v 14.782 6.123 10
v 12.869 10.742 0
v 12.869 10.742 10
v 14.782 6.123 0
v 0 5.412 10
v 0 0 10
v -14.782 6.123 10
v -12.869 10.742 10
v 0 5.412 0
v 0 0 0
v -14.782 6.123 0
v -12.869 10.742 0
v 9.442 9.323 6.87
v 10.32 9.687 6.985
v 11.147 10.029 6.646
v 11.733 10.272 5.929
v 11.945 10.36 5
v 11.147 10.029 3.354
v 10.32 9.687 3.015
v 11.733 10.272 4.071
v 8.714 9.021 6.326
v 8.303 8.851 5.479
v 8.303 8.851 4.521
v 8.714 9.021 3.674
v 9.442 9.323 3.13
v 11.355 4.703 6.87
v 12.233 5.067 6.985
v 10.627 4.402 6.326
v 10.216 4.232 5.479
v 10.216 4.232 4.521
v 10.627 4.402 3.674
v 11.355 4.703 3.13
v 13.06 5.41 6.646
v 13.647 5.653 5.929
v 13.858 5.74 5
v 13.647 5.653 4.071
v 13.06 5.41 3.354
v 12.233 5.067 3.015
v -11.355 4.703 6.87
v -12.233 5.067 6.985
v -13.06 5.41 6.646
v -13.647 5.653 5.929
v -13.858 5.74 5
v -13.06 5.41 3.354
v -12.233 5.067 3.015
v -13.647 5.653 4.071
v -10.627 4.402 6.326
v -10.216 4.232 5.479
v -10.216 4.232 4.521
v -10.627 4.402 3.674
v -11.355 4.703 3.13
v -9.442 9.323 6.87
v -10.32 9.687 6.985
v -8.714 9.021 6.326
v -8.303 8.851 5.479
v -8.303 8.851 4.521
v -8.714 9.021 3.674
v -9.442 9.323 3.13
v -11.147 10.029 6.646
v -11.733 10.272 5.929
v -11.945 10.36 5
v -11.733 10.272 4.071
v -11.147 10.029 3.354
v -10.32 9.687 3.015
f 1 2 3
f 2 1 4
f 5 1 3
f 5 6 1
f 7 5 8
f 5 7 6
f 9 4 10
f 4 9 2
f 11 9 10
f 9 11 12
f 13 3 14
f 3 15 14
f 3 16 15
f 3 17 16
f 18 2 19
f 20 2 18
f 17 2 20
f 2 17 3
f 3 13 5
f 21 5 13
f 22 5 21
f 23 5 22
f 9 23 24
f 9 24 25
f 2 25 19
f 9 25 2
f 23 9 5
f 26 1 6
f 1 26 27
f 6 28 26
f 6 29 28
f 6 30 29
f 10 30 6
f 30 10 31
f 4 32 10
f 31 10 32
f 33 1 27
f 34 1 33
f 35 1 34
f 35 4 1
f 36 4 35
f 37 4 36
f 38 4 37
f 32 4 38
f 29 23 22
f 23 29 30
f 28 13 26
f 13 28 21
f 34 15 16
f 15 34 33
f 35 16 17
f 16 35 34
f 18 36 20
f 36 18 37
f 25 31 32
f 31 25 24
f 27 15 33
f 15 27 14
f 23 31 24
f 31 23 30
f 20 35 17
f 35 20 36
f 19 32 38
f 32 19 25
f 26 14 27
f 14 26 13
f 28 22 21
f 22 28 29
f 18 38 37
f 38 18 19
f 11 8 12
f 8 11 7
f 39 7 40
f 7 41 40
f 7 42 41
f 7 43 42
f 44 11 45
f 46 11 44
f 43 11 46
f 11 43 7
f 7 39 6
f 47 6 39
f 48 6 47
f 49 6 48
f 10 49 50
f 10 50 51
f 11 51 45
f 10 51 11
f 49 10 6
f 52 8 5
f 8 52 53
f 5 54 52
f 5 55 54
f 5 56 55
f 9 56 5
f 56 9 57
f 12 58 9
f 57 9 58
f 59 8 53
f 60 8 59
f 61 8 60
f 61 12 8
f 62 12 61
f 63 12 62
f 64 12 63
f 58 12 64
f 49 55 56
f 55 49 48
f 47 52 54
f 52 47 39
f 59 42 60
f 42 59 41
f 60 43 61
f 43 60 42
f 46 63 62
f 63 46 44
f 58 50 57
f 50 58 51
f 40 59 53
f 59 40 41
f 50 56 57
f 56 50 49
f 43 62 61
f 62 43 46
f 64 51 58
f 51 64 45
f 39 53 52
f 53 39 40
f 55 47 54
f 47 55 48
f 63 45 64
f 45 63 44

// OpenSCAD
/** \file
 * Bracket to hold a 16x2 LED panel in an Octoscroller configuration.
 */

module bracket()
{
	render() difference()
	{
		cube([16,5,10]);

		translate([13,10,5])
		rotate([90,0,0])
		cylinder(r=2, h=20, $fs=1);
	}
}

rotate([0,0,+45/2]) bracket();
rotate([0,0,-45/2-180]) translate([0,-5,0]) bracket();

%translate([0,0,-1]) cube([200,200,2], center=true);
